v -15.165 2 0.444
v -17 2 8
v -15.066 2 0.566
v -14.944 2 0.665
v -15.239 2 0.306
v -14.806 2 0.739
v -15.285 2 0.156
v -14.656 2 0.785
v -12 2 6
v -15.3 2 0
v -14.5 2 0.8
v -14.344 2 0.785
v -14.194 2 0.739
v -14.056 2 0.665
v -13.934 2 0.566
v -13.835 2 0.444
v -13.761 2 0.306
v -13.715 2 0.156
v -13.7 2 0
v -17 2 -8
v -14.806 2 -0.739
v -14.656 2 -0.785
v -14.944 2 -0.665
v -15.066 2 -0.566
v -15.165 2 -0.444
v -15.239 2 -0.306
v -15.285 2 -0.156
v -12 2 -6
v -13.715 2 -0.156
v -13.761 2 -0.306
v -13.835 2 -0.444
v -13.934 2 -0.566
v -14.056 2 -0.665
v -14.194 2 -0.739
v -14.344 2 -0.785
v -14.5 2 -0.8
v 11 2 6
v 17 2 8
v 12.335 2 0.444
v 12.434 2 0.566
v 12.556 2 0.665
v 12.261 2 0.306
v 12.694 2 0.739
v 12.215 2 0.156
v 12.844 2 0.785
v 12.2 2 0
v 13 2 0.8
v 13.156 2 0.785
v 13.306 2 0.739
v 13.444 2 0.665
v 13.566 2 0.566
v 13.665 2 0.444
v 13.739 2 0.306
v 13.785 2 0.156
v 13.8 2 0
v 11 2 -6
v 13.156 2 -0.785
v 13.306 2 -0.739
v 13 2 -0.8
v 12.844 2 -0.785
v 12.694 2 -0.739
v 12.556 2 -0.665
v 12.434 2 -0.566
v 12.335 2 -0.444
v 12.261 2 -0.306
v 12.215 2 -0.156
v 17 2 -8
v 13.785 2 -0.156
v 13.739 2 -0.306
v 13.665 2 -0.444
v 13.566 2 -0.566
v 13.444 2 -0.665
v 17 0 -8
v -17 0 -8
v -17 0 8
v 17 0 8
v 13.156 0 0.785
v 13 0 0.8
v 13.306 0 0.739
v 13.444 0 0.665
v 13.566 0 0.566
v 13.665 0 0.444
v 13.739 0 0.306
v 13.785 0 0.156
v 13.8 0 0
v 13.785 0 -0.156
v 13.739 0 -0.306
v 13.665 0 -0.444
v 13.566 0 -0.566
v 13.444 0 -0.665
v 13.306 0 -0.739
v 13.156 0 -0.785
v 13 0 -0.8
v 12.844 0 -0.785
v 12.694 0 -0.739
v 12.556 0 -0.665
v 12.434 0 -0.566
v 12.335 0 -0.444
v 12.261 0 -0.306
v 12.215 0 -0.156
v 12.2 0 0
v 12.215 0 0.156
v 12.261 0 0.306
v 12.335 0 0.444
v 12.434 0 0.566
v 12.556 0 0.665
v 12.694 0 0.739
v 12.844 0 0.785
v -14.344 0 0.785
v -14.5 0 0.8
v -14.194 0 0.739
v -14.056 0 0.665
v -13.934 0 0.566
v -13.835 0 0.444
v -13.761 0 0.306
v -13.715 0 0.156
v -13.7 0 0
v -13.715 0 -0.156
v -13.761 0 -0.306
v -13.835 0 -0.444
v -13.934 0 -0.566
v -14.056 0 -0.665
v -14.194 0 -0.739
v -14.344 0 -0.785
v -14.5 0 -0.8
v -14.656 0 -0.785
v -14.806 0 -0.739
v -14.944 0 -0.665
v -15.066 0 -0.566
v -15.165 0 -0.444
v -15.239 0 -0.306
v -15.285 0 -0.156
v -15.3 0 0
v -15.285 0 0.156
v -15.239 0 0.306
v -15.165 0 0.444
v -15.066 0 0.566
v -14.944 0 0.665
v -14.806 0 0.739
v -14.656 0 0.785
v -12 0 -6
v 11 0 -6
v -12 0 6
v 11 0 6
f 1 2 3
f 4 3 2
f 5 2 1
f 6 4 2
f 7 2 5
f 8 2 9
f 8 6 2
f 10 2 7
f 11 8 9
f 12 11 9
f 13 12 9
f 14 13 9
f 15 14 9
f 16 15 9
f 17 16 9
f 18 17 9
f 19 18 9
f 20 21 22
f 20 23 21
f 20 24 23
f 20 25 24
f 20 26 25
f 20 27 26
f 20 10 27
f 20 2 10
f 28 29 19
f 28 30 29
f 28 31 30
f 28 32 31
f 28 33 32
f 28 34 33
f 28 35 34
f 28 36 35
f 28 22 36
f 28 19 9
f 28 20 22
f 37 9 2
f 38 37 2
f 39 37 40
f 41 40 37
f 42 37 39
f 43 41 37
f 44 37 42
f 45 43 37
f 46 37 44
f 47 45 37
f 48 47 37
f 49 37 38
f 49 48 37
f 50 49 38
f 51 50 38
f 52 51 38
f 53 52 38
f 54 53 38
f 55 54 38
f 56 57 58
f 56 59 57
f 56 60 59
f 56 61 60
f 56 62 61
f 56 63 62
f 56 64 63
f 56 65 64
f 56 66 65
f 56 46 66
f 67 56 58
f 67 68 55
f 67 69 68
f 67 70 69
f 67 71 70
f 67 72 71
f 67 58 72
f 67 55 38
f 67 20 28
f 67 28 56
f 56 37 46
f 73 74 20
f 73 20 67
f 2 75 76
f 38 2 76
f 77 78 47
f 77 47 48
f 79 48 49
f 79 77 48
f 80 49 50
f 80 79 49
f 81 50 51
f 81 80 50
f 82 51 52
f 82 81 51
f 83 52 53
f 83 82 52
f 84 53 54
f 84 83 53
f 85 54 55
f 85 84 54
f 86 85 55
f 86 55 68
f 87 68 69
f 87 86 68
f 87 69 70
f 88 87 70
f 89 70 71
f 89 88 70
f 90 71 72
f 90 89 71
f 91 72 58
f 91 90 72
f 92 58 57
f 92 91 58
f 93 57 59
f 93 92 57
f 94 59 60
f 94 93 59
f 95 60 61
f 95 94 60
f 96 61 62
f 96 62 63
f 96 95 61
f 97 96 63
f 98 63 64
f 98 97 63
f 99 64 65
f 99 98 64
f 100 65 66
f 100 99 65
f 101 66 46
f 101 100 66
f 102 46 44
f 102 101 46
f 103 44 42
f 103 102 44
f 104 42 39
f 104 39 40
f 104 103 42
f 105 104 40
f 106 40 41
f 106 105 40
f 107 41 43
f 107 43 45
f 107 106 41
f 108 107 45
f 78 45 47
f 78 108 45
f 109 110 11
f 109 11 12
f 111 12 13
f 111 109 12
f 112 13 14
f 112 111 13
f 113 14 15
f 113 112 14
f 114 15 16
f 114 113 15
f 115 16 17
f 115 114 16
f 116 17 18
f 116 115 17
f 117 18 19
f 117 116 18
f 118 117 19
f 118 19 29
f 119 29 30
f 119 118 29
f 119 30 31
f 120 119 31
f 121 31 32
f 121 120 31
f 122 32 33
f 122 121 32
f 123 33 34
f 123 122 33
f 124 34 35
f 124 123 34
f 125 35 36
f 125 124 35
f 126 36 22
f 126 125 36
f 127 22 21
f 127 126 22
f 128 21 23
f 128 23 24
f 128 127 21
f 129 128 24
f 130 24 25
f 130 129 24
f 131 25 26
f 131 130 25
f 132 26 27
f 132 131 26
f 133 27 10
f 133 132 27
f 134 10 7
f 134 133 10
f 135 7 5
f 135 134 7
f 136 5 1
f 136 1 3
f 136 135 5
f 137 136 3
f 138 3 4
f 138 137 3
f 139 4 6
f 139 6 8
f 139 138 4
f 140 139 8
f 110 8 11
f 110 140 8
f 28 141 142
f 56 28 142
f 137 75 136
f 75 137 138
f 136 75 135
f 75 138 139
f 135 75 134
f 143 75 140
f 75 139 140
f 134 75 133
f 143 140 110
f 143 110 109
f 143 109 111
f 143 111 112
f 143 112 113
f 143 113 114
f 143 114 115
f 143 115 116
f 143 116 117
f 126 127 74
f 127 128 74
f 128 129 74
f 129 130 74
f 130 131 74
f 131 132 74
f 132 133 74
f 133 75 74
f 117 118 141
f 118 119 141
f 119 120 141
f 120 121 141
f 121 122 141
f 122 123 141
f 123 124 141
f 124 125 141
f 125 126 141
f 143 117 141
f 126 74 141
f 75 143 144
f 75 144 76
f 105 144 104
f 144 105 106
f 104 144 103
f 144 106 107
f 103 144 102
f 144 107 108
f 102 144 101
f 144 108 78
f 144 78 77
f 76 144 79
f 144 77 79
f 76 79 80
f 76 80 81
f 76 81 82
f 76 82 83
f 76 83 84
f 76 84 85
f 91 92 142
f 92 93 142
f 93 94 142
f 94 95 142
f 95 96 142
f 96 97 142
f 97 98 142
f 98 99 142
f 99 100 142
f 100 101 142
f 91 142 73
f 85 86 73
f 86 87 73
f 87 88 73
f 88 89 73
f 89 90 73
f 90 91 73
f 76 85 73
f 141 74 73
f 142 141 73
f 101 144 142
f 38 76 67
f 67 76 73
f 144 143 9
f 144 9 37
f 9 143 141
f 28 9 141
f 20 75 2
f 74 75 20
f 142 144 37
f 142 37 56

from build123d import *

# Parameters (mm, degrees)
SKETCH1_W               = 34
SKETCH1_H               = 16
BOSS_EXTRUDE1_DEPTH     = 2
CUT_EXTRUDE1_DEPTH      = 19.894443628
CUT_EXTRUDE1_DEPTH_BACK = 19.894443628
SKETCH2_W               = 23
SKETCH2_H               = 12
SKETCH3_R               = 0.8
CUT_EXTRUDE5_DEPTH      = 2


with BuildPart() as part:
    # Sketch1 → Boss-Extrude1 (new body)
    with BuildSketch(Plane(origin=(0, 0, 0), x_dir=(1, 0, 0), z_dir=(0, 1, 0))):
        Rectangle(SKETCH1_W, SKETCH1_H)
    extrude(amount=BOSS_EXTRUDE1_DEPTH)

    # Sketch2 → Cut-Extrude1 (cut, two sides: drawn at the far end of the back side and taken through both)
    with BuildSketch(Plane(origin=(0, 2, 0), x_dir=(1, 0, 0), z_dir=(0, 1, 0)).offset(-CUT_EXTRUDE1_DEPTH_BACK)):
        with Locations((-0.5, 0)):
            Rectangle(SKETCH2_W, SKETCH2_H)
    extrude(amount=CUT_EXTRUDE1_DEPTH + CUT_EXTRUDE1_DEPTH_BACK, mode=Mode.SUBTRACT)

    # Sketch3 → Cut-Extrude5 (cut)
    with BuildSketch(Plane(origin=(0, 0, 0), x_dir=(1, 0, 0), z_dir=(0, 1, 0))):
        with Locations(Location((-14.5, 0, 0), (0, 0, 270))):
            Circle(SKETCH3_R)
        with Locations(Location((13, 0, 0), (0, 0, 270))):
            Circle(SKETCH3_R)
    extrude(amount=CUT_EXTRUDE5_DEPTH, mode=Mode.SUBTRACT)


solid = part.part
